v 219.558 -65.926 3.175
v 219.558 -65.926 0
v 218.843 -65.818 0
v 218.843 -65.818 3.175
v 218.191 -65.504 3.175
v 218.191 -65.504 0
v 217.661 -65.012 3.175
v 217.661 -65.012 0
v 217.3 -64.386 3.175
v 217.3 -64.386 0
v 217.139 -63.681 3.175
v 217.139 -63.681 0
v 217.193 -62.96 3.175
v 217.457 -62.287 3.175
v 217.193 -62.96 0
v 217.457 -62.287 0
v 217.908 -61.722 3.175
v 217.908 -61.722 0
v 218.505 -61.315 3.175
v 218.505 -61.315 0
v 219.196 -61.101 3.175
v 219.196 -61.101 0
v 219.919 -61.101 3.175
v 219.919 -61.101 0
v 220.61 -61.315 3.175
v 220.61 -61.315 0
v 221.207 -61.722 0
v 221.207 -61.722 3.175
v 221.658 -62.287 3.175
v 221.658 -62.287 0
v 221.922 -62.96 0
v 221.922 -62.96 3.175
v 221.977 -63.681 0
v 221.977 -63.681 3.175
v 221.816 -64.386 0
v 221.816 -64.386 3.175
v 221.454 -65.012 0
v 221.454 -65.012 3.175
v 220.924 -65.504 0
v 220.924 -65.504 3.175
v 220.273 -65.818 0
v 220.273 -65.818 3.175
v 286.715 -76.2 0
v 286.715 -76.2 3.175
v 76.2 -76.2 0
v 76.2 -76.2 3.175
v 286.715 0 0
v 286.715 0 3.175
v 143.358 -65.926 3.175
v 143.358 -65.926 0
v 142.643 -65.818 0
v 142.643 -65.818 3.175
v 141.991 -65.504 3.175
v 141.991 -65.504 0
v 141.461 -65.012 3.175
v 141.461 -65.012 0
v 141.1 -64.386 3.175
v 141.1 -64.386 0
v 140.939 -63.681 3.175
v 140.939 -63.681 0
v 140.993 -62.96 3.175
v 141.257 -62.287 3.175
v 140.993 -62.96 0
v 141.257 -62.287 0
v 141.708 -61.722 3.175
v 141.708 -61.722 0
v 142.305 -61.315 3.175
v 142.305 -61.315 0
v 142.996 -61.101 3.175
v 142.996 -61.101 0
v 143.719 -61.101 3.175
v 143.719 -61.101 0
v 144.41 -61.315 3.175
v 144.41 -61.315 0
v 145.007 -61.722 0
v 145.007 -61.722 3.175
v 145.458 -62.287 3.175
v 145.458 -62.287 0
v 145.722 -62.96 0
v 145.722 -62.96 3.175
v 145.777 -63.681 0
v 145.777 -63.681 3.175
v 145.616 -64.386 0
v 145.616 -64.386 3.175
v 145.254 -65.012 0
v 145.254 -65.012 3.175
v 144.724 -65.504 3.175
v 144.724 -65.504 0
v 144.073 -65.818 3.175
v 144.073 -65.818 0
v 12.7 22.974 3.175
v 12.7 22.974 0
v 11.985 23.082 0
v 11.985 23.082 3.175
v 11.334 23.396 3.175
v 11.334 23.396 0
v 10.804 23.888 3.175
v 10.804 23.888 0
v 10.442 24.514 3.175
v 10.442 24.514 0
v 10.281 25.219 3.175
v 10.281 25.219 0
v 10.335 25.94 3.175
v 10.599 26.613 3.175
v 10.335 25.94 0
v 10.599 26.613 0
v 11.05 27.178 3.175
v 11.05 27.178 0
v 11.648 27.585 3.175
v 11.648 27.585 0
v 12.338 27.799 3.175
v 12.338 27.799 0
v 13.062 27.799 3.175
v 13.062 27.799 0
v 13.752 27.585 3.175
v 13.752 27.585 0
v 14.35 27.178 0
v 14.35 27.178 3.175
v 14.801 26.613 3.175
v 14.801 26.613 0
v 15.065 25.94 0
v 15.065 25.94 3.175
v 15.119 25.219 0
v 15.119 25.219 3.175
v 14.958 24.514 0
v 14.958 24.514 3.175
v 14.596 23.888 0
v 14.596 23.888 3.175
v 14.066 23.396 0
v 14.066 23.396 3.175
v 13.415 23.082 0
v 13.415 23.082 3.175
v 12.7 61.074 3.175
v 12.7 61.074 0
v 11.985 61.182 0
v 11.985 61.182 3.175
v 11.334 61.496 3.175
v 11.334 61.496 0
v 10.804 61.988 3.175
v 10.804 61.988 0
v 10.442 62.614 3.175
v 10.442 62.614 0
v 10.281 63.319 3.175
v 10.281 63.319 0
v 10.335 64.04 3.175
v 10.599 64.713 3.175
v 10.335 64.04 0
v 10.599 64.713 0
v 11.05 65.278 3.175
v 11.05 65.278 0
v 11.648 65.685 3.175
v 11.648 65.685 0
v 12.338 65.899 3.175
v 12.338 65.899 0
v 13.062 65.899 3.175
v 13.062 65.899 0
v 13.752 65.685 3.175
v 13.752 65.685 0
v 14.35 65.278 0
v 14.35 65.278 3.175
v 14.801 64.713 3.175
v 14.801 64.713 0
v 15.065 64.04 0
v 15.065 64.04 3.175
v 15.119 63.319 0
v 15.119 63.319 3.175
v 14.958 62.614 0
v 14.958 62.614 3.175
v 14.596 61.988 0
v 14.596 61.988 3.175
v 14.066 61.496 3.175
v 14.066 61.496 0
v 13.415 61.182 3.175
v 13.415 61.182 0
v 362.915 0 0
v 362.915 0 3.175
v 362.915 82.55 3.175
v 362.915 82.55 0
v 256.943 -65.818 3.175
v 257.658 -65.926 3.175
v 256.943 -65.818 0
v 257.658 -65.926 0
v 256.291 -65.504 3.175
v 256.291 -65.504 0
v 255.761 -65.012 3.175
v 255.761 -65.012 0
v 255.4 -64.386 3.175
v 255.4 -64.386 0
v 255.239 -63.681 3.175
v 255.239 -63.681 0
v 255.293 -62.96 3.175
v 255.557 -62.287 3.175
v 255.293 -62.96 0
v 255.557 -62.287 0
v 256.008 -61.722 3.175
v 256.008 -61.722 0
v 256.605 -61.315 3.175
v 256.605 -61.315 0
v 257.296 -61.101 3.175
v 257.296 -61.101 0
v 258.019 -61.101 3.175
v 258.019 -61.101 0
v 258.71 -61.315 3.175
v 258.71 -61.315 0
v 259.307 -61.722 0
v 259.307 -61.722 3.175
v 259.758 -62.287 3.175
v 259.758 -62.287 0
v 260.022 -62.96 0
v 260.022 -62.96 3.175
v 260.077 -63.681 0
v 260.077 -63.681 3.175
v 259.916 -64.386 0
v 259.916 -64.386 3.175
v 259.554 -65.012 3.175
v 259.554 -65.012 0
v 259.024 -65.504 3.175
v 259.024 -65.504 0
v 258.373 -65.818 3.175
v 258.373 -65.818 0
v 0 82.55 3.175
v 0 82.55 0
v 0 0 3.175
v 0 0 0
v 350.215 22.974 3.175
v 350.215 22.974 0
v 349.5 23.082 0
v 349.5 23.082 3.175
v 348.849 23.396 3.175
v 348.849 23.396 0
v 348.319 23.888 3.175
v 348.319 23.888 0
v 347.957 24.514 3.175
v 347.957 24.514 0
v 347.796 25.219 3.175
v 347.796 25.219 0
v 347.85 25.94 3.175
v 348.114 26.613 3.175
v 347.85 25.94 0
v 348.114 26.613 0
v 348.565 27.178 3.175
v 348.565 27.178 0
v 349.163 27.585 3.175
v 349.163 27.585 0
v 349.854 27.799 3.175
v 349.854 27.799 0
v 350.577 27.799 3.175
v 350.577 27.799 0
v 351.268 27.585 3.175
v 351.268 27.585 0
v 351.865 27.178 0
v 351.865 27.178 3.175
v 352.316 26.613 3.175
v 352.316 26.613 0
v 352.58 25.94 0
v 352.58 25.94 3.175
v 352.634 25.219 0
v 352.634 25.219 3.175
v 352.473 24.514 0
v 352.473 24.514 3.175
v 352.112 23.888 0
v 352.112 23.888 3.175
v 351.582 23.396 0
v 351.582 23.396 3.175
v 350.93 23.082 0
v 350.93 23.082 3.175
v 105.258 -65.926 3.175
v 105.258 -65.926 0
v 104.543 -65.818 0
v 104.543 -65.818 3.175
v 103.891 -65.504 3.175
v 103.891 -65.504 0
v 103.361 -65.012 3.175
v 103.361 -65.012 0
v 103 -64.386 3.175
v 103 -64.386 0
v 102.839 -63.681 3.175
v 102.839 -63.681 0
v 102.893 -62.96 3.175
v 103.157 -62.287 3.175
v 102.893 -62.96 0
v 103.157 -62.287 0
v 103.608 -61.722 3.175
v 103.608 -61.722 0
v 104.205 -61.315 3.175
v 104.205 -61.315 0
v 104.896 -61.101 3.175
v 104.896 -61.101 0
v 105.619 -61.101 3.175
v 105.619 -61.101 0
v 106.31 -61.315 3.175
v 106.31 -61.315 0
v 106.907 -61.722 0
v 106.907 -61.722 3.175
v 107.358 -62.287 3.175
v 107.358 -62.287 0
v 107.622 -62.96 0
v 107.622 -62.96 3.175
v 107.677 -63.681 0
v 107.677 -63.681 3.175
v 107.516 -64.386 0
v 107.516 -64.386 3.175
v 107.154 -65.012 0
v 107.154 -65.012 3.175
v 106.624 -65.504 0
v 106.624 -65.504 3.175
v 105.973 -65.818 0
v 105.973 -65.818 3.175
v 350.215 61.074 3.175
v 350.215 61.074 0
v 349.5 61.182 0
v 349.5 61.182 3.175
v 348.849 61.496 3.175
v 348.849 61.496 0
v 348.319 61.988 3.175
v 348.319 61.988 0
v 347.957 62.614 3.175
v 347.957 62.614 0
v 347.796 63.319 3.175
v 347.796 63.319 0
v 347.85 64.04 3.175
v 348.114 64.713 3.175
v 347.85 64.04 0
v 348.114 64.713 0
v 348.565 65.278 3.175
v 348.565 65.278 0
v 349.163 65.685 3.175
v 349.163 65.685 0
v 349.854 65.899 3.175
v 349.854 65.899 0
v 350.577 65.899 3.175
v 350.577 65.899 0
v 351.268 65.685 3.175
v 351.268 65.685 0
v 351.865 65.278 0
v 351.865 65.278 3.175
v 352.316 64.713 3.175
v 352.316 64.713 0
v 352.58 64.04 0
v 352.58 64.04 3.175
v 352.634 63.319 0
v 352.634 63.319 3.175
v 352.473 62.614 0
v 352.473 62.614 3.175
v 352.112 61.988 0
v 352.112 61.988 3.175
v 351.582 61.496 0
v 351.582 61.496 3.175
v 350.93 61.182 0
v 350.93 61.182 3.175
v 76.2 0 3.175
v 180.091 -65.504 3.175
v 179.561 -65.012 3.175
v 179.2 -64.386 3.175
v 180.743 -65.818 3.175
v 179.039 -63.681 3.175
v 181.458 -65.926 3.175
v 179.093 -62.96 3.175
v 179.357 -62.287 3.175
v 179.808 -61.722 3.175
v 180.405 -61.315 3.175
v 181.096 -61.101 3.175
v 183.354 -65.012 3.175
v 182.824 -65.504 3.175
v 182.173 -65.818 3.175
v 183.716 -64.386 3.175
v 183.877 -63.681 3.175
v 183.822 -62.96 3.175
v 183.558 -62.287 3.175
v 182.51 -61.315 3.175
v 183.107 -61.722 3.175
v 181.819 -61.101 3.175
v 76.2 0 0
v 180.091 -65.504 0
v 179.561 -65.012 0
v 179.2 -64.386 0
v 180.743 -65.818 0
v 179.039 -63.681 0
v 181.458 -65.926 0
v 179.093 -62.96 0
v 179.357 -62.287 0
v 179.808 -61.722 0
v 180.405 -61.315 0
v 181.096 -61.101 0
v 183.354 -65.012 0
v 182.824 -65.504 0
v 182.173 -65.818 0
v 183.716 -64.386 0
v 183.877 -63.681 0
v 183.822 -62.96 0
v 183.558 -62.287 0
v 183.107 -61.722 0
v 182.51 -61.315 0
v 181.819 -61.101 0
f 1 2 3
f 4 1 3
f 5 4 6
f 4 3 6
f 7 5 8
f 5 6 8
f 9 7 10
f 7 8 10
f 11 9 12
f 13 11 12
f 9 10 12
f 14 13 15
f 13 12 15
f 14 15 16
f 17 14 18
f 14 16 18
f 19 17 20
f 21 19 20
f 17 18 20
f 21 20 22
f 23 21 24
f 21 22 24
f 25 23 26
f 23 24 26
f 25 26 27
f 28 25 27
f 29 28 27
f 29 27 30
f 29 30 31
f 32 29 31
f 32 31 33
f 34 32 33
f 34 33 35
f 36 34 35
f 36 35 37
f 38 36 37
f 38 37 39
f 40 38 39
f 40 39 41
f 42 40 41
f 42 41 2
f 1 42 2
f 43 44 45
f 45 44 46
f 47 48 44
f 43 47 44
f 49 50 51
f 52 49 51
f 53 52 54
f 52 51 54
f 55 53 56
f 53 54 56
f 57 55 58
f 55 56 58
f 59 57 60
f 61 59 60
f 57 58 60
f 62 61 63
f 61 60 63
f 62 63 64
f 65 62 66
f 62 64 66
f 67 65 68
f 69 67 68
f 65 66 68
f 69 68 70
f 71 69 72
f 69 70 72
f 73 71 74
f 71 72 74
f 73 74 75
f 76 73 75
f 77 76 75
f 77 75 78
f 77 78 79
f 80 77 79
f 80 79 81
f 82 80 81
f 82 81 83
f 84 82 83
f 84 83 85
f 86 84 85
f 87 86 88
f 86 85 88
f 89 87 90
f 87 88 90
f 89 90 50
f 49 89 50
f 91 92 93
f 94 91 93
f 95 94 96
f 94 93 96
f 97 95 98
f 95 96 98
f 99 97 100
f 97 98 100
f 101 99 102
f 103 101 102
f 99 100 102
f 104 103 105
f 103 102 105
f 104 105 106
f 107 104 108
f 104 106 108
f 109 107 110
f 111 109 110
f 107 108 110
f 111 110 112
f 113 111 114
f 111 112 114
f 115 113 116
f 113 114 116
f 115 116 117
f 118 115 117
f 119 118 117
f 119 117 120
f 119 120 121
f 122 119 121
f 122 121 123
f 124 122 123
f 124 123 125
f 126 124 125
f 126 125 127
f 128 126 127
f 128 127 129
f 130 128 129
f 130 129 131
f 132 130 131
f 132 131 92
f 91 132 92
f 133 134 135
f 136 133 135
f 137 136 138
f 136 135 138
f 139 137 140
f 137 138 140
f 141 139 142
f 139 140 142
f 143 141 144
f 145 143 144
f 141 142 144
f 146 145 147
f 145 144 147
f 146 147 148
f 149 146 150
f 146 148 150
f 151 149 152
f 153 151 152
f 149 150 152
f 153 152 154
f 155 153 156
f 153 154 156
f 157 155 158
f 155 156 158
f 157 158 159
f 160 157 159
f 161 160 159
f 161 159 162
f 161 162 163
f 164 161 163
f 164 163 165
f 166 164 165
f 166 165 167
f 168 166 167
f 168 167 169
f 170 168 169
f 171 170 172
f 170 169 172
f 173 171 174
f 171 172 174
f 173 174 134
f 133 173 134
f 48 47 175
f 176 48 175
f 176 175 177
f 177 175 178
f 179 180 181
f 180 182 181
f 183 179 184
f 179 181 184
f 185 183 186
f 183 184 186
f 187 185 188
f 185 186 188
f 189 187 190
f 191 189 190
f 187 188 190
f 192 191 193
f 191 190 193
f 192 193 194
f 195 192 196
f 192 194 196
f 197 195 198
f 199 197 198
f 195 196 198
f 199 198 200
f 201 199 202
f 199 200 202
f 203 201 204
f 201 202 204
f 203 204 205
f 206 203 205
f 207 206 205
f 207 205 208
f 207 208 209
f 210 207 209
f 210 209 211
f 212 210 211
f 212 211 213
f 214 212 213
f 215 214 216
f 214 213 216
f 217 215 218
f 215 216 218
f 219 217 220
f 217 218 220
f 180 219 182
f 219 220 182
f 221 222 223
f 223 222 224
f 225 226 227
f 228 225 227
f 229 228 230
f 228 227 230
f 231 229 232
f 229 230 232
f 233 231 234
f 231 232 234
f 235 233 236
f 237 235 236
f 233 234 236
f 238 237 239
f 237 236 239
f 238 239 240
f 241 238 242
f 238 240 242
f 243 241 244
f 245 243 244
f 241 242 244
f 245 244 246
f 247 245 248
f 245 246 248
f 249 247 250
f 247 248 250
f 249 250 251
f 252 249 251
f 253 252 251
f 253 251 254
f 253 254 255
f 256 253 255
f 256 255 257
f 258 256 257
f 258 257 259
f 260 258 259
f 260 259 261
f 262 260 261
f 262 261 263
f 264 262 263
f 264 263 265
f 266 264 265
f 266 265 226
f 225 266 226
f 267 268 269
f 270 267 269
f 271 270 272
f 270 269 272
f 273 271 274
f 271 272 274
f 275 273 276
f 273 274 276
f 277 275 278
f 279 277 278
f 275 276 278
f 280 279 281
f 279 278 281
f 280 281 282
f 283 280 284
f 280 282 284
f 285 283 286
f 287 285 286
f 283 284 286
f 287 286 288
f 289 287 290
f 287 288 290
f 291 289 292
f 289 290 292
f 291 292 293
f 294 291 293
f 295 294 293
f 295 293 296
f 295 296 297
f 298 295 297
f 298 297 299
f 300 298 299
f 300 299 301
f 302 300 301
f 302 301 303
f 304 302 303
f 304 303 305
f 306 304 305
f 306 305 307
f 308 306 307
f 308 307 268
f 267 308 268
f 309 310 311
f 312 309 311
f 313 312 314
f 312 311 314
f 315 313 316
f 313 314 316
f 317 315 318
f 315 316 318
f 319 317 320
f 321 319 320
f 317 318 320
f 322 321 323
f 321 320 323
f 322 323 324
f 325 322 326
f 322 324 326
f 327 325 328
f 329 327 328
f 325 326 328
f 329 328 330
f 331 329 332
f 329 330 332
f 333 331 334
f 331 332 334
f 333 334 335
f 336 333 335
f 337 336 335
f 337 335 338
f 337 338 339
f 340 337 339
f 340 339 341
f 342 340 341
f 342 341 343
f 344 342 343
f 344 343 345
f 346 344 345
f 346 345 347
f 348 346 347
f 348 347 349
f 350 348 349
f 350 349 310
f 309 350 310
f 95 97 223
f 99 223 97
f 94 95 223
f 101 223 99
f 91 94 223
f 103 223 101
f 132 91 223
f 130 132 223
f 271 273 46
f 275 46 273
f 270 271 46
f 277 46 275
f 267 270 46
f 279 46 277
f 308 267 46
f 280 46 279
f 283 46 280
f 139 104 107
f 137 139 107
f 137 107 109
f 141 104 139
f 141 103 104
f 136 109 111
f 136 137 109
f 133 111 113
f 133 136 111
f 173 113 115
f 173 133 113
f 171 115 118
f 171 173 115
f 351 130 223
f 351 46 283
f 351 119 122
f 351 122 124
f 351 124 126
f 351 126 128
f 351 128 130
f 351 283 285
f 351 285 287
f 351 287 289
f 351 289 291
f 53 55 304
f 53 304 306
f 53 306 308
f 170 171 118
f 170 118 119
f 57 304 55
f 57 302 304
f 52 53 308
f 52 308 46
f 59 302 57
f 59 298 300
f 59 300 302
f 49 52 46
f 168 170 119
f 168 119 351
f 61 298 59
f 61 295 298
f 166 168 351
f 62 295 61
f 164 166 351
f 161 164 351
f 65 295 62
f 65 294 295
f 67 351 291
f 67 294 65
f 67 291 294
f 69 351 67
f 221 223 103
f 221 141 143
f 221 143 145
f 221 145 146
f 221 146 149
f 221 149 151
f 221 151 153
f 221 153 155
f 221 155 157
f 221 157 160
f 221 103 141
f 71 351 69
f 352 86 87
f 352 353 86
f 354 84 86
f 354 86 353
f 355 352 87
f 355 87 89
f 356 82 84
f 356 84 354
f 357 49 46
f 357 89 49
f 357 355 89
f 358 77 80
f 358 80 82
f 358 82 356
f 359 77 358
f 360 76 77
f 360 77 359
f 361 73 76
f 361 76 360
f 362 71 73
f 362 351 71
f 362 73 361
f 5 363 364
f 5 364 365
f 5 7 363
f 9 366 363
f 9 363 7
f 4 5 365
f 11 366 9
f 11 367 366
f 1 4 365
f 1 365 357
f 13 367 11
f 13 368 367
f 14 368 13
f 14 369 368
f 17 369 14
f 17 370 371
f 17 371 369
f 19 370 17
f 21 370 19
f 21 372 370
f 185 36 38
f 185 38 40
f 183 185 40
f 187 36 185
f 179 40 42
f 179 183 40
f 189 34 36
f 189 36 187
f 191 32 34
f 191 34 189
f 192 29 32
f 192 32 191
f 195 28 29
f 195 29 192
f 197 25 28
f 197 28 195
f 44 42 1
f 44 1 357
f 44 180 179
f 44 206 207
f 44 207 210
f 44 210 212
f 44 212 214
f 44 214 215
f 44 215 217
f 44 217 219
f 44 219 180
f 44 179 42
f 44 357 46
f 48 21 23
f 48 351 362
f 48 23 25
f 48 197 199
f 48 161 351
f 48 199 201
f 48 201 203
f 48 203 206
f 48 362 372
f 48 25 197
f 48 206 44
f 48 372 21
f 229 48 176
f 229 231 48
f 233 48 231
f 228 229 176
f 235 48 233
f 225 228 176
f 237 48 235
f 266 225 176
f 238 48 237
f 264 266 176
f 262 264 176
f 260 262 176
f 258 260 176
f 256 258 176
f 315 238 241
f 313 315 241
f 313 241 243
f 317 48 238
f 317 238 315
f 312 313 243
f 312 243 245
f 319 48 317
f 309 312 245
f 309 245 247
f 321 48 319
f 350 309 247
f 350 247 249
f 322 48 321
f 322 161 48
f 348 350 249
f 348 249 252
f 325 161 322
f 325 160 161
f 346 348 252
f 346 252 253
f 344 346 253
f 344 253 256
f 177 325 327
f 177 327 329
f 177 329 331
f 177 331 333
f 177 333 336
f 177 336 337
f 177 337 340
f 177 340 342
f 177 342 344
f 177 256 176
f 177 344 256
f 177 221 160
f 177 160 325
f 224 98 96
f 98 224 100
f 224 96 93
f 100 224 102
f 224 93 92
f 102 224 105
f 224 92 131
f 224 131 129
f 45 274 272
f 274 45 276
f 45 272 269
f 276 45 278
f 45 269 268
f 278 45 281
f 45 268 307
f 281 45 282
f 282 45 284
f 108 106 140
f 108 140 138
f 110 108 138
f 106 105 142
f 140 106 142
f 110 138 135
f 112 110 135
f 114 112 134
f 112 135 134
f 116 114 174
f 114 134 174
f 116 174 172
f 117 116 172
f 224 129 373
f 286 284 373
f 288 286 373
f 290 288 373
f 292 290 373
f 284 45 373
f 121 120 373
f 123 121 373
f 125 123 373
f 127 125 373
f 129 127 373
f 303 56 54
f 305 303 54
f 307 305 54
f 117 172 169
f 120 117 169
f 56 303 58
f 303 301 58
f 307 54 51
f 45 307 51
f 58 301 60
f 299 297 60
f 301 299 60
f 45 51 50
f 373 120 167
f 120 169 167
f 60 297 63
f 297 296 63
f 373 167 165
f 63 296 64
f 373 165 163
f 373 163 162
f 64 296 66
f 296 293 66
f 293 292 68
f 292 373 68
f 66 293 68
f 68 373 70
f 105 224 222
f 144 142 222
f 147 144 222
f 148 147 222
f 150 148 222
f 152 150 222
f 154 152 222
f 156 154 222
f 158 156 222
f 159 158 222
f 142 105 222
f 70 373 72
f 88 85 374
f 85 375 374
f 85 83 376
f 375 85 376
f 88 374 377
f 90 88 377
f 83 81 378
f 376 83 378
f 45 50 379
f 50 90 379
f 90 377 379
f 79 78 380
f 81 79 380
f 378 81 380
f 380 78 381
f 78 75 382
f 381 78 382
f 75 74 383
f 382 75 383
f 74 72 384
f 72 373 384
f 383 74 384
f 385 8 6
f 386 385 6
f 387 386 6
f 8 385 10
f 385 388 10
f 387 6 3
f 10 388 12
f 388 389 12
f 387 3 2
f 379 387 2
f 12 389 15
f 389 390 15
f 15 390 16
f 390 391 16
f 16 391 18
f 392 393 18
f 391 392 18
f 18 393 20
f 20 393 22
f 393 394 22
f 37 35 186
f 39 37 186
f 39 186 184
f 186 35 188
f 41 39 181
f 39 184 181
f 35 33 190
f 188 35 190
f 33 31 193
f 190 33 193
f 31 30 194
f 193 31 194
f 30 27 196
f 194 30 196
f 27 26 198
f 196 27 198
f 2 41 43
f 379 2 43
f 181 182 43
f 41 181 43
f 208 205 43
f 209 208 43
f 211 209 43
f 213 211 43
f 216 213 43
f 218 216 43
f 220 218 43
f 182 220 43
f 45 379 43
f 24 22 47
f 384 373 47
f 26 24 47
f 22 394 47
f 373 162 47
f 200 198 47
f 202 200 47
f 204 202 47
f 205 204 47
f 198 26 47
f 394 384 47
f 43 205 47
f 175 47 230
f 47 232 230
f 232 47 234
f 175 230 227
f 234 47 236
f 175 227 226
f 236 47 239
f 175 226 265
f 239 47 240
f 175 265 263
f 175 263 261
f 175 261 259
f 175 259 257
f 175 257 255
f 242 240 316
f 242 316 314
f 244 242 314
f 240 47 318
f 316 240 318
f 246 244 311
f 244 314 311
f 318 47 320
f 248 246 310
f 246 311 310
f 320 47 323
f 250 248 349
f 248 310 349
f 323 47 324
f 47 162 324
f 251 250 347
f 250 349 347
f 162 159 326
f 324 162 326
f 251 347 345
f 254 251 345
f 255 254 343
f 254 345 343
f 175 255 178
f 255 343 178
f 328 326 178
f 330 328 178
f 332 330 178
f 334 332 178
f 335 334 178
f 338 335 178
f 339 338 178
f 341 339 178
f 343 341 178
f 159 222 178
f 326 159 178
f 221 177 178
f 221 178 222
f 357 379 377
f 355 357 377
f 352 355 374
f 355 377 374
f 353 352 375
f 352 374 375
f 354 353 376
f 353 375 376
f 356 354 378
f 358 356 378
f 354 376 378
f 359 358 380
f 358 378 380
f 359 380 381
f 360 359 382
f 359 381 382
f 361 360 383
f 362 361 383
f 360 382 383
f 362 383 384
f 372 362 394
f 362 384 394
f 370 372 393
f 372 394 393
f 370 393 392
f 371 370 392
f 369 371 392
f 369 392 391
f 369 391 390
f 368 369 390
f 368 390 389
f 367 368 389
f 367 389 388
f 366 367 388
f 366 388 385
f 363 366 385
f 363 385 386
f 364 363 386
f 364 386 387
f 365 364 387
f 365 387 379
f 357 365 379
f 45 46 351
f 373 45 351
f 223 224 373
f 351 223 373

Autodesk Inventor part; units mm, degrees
ref_plane "YZ Plane" through (0, 0, 0) normal (1, 0, 0) x (0, 1, 0)
ref_plane "XZ Plane" through (0, 0, 0) normal (0, 1, 0) x (-1, 0, 0)
ref_plane "XY Plane" through (0, 0, 0) normal (0, 0, 1) x (1, 0, 0)
sketch "Sketch1" plane through (0, 0, 0) normal (0, 0, 1) x (1, 0, 0)
  line L0 (0, 0) -> (362.9152, 0)
  line L1 (362.9152, 0) -> (362.9152, 127)
  line L2 (362.9152, 127) -> (0, 127)
  line L3 (0, 127) -> (0, 0)
  dimension "d0" = 362.9152
  dimension "d1" = 127
extrude "Extrusion1" add sketch "Sketch1" along normal blind 3.175
sketch "Sketch2" plane through (0, 0, 3.175) normal (0, 0, 1) x (1, 0, 0)
  line L0 (0, 127) -> (0, 0) projected
  line L1 (362.9152, 0) -> (362.9152, 127) projected
  line L2 (362.9152, 127) -> (0, 127) projected
  line L3 (0, 0) -> (362.9152, 0) projected
  point P0 (12.7, 25.4)
  point P1 (12.7, 63.5)
  point P2 (350.2152, 25.4)
  point P3 (350.2152, 63.5)
  point P4 (12.7, 101.6)
  point P5 (350.2152, 101.6)
  dimension "d4" = 12.7
  dimension "d5" = 12.7
  dimension "d6" = 12.7
  dimension "d7" = 12.7
  dimension "d8" = 12.7
  dimension "d9" = 12.7
  dimension "d10" = 25.4
  dimension "d11" = 25.4
  dimension "d12" = 38.1
hole "Hole1" at (12.7, 25.4, 3.175) at (12.7, 63.5, 3.175) at (350.2152, 25.4, 3.175) at (350.2152, 63.5, 3.175) at (12.7, 101.6, 3.175) at (350.2152, 101.6, 3.175) direction (0, 0, -1) diameter 4.8514 end through all
sketch "Sketch3" plane through (0, 0, 3.175) normal (0, 0, 1) x (1, 0, 0)
  line L0 (0, 127) -> (0, 0) projected
  line L1 (362.9152, 0) -> (362.9152, 127) projected
  line L2 (0, 127) -> (362.9152, 127)
  line L3 (362.9152, 127) -> (362.9152, 82.55)
  line L4 (362.9152, 82.55) -> (0, 82.55)
  line L5 (0, 82.55) -> (0, 127)
  line L6 (0, 0) -> (362.9152, 0) projected
  line L7 (91.1104, 0) -> (300.3978, 0)
  line L8 (300.3978, 0) -> (300.3978, -76.2)
  line L9 (300.3978, -76.2) -> (91.1104, -76.2)
  line L10 (91.1104, -76.2) -> (91.1104, 0)
  dimension "d20" = 76.2
  dimension "d21" = 44.45
extrude "Extrusion2" cut sketch "Sketch3" against normal blind 25.4 contours L2 L1 L4 L0
sketch "Sketch4" plane through (0, 0, 3.175) normal (0, 0, 1) x (1, 0, 0)
  line L0 (0, 0) -> (362.9152, 0) projected
  line L1 (76.2, 0) -> (286.7152, 0)
  line L2 (286.7152, 0) -> (286.7152, -76.2)
  line L3 (286.7152, -76.2) -> (76.2, -76.2)
  line L4 (76.2, -76.2) -> (76.2, 0)
  line L5 (0, 82.55) -> (0, 0) projected
  line L6 (362.9152, 0) -> (362.9152, 82.55) projected
  dimension "d24" = 76.2
  dimension "d25" = 76.2
  dimension "d26" = 76.2
extrude "Extrusion3" add sketch "Sketch4" against normal blind 3.175
sketch "Sketch5" plane through (0, 0, 3.175) normal (0, 0, 1) x (1, 0, 0)
  line L0 (286.7152, -76.2) -> (76.2, -76.2) projected
  line L1 (76.2, -76.2) -> (76.2, 0) projected
  point P0 (0, 0)
  point P1 (105.2576, -63.5)
  point P2 (143.3576, -63.5)
  point P3 (181.4576, -63.5)
  point P4 (219.5576, -63.5)
  point P5 (257.6576, -63.5)
  dimension "d29" = 38.1
  dimension "d30" = 38.1
  dimension "d31" = 38.1
  dimension "d32" = 38.1
  dimension "d33" = 12.7
  dimension "d34" = 29.0576
hole "Hole2" at (105.2576, -63.5, 3.175) at (143.3576, -63.5, 3.175) at (181.4576, -63.5, 3.175) at (219.5576, -63.5, 3.175) at (257.6576, -63.5, 3.175) direction (0, 0, -1) diameter 4.8514 end through all
properties part number "SUP_021_LexanShield"
